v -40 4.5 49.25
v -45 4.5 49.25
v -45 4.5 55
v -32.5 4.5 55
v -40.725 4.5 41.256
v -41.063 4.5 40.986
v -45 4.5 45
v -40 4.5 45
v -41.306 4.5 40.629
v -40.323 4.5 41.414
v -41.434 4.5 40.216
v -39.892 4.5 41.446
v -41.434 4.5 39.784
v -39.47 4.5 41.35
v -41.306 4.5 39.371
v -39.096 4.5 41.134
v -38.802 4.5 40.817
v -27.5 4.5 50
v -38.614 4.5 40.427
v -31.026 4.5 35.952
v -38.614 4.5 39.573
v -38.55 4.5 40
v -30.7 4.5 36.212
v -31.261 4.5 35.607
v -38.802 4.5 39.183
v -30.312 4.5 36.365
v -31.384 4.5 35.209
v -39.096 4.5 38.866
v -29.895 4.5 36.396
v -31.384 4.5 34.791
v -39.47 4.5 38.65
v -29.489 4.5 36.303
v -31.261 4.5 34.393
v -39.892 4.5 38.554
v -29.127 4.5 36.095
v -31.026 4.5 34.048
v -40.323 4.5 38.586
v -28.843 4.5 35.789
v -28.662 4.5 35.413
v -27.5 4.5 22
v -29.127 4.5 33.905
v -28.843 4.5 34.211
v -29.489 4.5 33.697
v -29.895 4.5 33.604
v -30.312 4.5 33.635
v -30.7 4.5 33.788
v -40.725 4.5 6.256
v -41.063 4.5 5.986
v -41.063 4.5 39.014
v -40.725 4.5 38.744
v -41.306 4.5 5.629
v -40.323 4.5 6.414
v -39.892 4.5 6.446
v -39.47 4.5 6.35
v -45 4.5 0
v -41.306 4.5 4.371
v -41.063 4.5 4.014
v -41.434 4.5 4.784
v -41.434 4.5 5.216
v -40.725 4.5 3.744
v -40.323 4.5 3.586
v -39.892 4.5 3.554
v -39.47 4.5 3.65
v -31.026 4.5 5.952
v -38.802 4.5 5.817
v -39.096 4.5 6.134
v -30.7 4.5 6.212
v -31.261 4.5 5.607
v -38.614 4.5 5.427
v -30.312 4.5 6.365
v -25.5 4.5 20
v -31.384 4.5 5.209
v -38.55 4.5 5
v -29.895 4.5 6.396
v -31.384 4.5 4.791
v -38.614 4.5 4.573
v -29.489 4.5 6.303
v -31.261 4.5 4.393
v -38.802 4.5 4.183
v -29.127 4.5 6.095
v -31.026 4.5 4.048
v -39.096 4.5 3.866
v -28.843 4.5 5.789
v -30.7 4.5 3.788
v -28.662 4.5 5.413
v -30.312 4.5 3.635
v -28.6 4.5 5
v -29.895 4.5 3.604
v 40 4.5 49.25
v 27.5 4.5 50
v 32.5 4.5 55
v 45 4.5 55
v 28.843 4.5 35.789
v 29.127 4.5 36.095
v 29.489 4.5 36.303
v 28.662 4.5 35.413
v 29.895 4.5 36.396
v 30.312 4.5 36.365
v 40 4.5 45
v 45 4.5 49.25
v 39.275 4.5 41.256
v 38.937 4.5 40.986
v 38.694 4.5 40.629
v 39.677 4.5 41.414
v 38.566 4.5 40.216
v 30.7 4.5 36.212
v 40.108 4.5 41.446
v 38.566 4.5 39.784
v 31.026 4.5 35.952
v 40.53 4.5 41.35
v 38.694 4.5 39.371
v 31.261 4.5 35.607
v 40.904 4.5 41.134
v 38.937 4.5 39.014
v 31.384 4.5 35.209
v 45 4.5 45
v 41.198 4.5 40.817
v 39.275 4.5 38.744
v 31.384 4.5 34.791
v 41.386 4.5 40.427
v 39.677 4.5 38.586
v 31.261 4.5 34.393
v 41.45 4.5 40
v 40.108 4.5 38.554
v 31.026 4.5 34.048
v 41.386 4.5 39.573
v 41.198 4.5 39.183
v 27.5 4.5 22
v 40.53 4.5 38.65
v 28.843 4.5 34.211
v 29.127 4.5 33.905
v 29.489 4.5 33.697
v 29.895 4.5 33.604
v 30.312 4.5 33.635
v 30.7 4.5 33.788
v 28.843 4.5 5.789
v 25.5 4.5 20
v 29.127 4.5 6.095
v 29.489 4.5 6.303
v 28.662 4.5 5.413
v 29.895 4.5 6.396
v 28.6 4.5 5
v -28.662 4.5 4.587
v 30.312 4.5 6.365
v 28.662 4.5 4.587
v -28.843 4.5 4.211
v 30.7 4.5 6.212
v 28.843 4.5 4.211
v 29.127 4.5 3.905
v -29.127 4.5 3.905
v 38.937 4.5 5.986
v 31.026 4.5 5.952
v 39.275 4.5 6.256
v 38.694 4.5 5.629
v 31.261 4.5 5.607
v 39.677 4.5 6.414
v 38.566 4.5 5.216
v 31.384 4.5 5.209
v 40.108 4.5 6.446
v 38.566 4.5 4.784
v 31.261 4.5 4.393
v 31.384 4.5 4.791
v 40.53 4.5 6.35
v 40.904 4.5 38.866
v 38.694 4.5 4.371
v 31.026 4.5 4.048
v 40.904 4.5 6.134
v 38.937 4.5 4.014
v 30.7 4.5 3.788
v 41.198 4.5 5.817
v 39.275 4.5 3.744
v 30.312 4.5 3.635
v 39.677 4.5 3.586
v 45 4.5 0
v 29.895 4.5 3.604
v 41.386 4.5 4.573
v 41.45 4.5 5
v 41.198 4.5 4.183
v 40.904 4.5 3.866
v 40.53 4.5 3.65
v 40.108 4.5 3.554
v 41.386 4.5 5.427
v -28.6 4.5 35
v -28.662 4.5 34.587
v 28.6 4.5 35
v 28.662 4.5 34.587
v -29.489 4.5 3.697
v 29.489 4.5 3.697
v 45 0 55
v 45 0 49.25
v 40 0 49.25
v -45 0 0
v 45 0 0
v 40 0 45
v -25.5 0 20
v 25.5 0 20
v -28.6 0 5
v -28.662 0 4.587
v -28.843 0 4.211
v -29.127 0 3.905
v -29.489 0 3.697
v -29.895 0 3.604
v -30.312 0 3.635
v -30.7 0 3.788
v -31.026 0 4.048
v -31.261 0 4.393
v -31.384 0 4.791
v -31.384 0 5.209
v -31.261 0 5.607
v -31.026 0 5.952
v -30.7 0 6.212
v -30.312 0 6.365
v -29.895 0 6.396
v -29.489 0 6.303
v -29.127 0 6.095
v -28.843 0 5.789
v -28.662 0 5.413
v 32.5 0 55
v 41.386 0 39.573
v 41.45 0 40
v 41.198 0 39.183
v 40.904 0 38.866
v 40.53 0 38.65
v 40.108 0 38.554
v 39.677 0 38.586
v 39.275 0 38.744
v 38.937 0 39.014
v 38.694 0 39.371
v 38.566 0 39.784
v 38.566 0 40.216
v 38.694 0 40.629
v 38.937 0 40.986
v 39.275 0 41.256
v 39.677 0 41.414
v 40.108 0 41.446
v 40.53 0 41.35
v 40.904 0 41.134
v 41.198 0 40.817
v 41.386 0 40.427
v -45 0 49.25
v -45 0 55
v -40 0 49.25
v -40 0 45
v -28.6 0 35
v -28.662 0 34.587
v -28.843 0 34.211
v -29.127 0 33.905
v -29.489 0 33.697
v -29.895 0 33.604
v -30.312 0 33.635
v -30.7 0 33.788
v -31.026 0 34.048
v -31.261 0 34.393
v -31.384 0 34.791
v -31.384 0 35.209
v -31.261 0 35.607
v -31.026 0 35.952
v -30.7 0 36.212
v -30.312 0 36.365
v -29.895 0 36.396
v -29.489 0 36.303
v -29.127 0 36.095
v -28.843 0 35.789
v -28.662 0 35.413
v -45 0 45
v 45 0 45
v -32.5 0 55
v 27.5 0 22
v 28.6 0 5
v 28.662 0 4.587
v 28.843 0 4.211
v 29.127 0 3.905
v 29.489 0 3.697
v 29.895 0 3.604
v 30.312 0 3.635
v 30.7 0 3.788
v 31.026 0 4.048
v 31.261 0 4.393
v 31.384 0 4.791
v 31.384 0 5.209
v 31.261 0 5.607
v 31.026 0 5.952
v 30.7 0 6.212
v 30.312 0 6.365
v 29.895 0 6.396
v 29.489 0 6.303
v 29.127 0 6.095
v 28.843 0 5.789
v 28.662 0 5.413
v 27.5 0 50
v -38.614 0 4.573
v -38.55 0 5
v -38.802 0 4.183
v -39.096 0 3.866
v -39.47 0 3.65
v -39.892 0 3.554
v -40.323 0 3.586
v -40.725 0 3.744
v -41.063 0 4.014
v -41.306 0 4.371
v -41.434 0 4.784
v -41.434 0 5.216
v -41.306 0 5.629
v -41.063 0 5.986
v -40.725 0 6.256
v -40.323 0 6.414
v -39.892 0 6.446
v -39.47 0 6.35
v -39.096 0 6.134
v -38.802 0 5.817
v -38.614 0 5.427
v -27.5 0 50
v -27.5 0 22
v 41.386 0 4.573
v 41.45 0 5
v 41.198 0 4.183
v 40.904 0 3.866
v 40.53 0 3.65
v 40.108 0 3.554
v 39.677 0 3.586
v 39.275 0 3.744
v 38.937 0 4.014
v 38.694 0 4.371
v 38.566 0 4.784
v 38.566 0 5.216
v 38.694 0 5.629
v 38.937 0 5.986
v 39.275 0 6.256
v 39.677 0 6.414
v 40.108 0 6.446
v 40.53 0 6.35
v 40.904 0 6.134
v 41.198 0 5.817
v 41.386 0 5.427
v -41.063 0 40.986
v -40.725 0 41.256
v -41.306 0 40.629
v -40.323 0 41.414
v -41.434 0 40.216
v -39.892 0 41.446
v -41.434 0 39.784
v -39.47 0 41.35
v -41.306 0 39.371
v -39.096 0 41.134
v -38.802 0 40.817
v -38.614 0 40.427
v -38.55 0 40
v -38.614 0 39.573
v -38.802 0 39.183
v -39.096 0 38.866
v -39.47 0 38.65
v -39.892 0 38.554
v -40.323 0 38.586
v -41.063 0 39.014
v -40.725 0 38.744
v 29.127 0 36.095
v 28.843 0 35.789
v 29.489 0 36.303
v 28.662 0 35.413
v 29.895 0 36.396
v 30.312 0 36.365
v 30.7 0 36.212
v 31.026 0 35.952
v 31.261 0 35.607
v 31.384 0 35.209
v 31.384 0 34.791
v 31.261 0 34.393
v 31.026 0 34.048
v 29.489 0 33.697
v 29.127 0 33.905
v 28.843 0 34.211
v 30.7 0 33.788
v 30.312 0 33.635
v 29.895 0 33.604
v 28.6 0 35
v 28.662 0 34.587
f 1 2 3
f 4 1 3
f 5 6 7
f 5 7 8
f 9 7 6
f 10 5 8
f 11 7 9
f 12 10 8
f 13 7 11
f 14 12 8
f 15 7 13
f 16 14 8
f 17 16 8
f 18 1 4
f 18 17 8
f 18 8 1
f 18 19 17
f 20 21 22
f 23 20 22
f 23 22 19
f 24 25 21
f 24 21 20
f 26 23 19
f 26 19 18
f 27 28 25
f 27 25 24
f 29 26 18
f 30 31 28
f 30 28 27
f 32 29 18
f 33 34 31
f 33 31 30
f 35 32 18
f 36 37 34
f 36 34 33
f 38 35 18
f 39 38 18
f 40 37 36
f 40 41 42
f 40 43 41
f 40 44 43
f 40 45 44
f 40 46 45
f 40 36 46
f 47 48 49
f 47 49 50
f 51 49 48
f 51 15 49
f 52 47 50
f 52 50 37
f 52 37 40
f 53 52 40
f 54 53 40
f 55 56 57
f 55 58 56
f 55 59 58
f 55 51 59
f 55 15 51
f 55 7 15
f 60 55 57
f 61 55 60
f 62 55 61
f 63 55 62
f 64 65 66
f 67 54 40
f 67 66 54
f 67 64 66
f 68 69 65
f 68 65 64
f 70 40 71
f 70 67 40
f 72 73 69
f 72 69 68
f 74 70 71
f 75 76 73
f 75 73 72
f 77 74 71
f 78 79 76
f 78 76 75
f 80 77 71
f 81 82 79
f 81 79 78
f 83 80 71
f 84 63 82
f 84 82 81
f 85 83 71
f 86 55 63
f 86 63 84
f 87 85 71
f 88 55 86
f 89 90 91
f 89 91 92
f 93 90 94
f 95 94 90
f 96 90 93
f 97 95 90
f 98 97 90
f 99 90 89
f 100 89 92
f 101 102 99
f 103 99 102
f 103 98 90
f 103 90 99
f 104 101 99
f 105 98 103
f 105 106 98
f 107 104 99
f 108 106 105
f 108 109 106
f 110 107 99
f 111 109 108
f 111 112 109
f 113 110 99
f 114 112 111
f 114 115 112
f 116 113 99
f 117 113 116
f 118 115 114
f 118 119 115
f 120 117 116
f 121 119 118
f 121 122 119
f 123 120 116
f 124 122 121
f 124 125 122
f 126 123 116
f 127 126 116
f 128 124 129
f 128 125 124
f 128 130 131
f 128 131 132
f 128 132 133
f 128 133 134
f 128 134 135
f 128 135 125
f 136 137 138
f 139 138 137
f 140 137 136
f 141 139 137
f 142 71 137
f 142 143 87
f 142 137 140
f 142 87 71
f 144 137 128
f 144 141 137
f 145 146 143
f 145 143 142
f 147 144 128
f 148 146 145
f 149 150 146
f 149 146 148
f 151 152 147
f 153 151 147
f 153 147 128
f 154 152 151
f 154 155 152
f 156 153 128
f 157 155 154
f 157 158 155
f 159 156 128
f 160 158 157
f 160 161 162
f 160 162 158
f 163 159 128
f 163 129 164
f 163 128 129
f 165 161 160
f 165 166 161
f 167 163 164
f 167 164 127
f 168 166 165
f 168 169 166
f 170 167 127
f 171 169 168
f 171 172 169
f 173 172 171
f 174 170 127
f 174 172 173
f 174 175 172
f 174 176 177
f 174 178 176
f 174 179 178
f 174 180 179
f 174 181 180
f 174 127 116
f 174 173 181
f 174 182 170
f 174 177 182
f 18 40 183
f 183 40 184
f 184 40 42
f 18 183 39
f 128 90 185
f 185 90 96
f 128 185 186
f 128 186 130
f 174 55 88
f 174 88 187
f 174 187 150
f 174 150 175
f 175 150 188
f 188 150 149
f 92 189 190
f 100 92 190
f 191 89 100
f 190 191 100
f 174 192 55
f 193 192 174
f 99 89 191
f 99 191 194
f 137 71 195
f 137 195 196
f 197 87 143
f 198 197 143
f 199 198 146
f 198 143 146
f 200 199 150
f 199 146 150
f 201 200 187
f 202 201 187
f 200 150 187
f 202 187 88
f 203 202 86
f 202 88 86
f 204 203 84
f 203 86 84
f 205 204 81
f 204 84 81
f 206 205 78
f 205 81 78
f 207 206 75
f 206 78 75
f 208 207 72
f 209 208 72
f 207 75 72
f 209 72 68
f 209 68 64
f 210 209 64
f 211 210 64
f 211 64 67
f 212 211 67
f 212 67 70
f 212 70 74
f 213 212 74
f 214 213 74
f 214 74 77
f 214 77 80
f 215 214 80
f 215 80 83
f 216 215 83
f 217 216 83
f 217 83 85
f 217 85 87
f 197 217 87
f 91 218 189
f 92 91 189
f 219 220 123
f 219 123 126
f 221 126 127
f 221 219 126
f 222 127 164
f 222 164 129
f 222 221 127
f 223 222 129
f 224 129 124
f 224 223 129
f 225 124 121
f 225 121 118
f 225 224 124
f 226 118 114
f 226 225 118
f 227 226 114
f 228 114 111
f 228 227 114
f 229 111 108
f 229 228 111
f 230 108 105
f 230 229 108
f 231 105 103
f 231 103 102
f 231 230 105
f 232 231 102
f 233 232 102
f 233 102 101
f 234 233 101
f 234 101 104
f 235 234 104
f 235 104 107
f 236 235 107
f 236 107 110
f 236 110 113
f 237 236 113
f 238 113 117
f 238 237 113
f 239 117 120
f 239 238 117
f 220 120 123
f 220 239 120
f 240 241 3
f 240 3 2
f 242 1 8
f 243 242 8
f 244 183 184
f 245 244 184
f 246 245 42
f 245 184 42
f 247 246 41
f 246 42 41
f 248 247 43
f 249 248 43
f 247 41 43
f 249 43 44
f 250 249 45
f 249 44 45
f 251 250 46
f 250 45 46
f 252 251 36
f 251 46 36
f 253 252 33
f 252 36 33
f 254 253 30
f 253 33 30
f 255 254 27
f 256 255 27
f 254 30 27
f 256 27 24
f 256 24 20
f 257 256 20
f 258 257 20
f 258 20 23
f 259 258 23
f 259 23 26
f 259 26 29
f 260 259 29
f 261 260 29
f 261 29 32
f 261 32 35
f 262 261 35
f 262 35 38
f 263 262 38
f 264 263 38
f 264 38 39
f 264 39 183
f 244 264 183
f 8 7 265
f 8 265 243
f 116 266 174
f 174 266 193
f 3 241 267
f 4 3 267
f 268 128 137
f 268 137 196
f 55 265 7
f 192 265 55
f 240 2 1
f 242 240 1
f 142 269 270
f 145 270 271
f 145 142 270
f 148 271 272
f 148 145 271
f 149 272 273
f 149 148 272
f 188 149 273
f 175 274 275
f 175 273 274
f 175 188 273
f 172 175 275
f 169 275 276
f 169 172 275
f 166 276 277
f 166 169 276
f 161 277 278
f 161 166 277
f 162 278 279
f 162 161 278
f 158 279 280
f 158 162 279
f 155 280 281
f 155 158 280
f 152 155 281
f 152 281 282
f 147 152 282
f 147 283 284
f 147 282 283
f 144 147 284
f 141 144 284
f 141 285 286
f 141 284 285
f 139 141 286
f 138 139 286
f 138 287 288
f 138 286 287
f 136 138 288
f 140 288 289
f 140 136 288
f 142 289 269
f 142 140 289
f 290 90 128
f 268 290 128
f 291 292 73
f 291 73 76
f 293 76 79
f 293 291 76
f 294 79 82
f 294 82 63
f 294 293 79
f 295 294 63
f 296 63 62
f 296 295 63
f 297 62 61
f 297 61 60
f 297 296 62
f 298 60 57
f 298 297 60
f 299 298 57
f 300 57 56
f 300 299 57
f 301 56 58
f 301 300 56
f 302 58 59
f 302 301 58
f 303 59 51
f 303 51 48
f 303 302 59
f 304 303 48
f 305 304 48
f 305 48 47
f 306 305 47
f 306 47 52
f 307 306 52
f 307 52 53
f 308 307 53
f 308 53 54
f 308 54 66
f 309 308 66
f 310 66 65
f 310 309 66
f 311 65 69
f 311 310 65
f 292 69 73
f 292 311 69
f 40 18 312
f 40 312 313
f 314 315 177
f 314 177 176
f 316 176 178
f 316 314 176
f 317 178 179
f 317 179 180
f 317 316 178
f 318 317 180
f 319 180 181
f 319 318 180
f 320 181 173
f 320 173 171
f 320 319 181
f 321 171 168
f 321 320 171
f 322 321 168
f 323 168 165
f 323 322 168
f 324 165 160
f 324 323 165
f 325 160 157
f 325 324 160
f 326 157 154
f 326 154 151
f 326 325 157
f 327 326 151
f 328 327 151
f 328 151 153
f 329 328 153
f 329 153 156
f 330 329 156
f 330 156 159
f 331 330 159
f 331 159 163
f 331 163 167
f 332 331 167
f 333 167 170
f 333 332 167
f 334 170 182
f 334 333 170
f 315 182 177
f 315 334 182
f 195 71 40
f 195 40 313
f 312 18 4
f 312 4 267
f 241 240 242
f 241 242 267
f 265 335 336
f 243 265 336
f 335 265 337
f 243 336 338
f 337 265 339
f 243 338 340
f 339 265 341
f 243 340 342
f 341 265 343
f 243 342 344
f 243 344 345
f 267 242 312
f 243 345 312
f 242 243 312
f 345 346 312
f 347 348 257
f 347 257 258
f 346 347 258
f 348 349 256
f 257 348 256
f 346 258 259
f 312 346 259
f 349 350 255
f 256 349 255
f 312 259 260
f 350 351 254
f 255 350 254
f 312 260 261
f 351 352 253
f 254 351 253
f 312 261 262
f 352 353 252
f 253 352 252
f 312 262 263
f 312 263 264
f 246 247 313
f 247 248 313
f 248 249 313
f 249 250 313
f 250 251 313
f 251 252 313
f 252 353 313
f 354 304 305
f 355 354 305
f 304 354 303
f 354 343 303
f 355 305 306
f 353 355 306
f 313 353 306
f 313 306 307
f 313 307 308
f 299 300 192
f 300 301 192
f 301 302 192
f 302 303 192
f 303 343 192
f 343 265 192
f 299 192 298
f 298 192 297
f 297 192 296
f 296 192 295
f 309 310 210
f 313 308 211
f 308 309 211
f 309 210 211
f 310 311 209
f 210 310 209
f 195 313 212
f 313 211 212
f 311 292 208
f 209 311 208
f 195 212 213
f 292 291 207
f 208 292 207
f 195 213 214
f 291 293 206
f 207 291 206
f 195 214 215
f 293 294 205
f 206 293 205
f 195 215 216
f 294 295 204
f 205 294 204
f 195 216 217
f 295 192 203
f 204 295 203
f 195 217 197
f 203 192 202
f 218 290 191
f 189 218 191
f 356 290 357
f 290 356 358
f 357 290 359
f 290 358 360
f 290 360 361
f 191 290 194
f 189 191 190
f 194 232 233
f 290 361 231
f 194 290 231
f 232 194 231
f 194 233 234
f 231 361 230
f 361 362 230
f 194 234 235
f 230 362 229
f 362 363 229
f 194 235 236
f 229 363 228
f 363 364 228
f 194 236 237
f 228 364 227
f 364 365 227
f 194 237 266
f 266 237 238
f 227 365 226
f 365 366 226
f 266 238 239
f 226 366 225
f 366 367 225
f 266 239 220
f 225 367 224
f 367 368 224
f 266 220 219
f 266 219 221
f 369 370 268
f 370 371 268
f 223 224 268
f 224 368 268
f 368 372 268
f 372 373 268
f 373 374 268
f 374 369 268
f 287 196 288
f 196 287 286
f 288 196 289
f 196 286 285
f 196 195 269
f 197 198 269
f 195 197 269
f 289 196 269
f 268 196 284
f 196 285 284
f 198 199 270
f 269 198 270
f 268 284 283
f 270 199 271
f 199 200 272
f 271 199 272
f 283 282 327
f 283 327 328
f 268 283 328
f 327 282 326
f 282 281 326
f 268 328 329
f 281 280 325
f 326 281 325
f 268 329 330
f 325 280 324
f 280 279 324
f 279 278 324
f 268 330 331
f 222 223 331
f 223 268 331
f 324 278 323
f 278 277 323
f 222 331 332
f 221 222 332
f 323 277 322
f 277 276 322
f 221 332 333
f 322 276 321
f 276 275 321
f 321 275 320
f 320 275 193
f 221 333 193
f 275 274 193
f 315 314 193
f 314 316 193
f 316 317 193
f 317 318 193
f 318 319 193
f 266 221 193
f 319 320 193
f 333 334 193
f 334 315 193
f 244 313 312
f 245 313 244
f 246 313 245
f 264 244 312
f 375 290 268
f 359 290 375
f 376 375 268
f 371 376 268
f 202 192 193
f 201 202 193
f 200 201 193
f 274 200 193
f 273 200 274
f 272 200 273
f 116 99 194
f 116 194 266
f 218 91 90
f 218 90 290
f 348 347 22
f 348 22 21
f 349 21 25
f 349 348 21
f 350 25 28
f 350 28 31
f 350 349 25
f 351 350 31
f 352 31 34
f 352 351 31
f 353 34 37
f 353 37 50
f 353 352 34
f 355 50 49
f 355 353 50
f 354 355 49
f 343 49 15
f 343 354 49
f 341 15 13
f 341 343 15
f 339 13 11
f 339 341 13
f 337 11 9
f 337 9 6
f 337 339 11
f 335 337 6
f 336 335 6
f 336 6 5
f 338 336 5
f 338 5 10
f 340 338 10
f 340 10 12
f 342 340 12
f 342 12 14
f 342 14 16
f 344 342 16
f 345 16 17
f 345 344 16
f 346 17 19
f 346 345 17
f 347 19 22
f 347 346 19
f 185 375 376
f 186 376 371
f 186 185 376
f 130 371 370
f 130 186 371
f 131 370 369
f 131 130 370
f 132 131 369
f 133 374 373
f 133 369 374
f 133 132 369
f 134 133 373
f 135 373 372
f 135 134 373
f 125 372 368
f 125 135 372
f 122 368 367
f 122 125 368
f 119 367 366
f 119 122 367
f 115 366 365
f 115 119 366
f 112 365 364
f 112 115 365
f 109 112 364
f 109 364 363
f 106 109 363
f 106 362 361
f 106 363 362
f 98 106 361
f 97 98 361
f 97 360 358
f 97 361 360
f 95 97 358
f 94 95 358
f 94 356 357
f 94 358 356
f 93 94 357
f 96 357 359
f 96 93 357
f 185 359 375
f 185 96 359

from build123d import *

# Parameters (mm, degrees)
SKETCH1_W           = 90
SKETCH1_H           = 55
SKETCH1_R           = 1.45
BOSS_EXTRUDE1_DEPTH = 4.5
SKETCH2_W           = 55
SKETCH2_H           = 35
CUT_EXTRUDE1_DEPTH  = 5.5
SKETCH3_W           = 5
SKETCH3_H           = 4.25
CUT_EXTRUDE2_DEPTH  = 5.5
SKETCH4_R           = 1.4
CUT_EXTRUDE3_DEPTH  = 5.5
CHAMFER1_SIZE       = 5
CHAMFER2_SIZE       = 2


with BuildPart() as part:
    # Sketch1 → Boss-Extrude1 (new body)
    with BuildSketch(Plane(origin=(0, 0, 0), x_dir=(1, 0, 0), z_dir=(0, 1, 0))):
        with Locations((0, -27.5)):
            Rectangle(SKETCH1_W, SKETCH1_H)
        with Locations((-40, -40)):
            Circle(SKETCH1_R, mode=Mode.SUBTRACT)
        with Locations((-40, -5)):
            Circle(SKETCH1_R, mode=Mode.SUBTRACT)
        with Locations((40, -40)):
            Circle(SKETCH1_R, mode=Mode.SUBTRACT)
        with Locations((40, -5)):
            Circle(SKETCH1_R, mode=Mode.SUBTRACT)
    extrude(amount=BOSS_EXTRUDE1_DEPTH)

    # Sketch2 → Cut-Extrude1 (cut, through all)
    with BuildSketch(Plane(origin=(0, 4.5, 0), x_dir=(1, 0, 0), z_dir=(0, 1, 0))):
        with Locations((0, -37.5)):
            Rectangle(SKETCH2_W, SKETCH2_H)
    extrude(amount=-CUT_EXTRUDE1_DEPTH, mode=Mode.SUBTRACT)

    # Sketch3 → Cut-Extrude2 (cut, through all)
    with BuildSketch(Plane(origin=(0, 4.5, 0), x_dir=(1, 0, 0), z_dir=(0, 1, 0))):
        with Locations((-42.5, -47.125)):
            Rectangle(SKETCH3_W, SKETCH3_H)
        with Locations((42.5, -47.125)):
            Rectangle(SKETCH3_W, SKETCH3_H)
    extrude(amount=-CUT_EXTRUDE2_DEPTH, mode=Mode.SUBTRACT)

    # Sketch4 → Cut-Extrude3 (cut, through all)
    with BuildSketch(Plane(origin=(0, 4.5, 0), x_dir=(1, 0, 0), z_dir=(0, 1, 0))):
        with Locations((-30, -35)):
            Circle(SKETCH4_R)
        with Locations((-30, -5)):
            Circle(SKETCH4_R)
    cut_extrude3 = extrude(amount=-CUT_EXTRUDE3_DEPTH, mode=Mode.SUBTRACT)

    # Mirror1: Cut-Extrude3 across plane
    add(cut_extrude3.mirror(Plane(origin=(0, 0, 0), x_dir=(0, 0, 1), z_dir=(1, 0, 0))), mode=Mode.SUBTRACT)

    # Chamfer1
    chamfer1_edges = [part.edges().sort_by_distance(p)[0] for p in [
        (27.5, 2.25, 55),
        (-27.5, 2.25, 55),
    ]]
    chamfer(chamfer1_edges, length=CHAMFER1_SIZE)

    # Chamfer2
    chamfer2_edges = [part.edges().sort_by_distance(p)[0] for p in [
        (27.5, 2.25, 20),
        (-27.5, 2.25, 20),
    ]]
    chamfer(chamfer2_edges, length=CHAMFER2_SIZE)


solid = part.part
